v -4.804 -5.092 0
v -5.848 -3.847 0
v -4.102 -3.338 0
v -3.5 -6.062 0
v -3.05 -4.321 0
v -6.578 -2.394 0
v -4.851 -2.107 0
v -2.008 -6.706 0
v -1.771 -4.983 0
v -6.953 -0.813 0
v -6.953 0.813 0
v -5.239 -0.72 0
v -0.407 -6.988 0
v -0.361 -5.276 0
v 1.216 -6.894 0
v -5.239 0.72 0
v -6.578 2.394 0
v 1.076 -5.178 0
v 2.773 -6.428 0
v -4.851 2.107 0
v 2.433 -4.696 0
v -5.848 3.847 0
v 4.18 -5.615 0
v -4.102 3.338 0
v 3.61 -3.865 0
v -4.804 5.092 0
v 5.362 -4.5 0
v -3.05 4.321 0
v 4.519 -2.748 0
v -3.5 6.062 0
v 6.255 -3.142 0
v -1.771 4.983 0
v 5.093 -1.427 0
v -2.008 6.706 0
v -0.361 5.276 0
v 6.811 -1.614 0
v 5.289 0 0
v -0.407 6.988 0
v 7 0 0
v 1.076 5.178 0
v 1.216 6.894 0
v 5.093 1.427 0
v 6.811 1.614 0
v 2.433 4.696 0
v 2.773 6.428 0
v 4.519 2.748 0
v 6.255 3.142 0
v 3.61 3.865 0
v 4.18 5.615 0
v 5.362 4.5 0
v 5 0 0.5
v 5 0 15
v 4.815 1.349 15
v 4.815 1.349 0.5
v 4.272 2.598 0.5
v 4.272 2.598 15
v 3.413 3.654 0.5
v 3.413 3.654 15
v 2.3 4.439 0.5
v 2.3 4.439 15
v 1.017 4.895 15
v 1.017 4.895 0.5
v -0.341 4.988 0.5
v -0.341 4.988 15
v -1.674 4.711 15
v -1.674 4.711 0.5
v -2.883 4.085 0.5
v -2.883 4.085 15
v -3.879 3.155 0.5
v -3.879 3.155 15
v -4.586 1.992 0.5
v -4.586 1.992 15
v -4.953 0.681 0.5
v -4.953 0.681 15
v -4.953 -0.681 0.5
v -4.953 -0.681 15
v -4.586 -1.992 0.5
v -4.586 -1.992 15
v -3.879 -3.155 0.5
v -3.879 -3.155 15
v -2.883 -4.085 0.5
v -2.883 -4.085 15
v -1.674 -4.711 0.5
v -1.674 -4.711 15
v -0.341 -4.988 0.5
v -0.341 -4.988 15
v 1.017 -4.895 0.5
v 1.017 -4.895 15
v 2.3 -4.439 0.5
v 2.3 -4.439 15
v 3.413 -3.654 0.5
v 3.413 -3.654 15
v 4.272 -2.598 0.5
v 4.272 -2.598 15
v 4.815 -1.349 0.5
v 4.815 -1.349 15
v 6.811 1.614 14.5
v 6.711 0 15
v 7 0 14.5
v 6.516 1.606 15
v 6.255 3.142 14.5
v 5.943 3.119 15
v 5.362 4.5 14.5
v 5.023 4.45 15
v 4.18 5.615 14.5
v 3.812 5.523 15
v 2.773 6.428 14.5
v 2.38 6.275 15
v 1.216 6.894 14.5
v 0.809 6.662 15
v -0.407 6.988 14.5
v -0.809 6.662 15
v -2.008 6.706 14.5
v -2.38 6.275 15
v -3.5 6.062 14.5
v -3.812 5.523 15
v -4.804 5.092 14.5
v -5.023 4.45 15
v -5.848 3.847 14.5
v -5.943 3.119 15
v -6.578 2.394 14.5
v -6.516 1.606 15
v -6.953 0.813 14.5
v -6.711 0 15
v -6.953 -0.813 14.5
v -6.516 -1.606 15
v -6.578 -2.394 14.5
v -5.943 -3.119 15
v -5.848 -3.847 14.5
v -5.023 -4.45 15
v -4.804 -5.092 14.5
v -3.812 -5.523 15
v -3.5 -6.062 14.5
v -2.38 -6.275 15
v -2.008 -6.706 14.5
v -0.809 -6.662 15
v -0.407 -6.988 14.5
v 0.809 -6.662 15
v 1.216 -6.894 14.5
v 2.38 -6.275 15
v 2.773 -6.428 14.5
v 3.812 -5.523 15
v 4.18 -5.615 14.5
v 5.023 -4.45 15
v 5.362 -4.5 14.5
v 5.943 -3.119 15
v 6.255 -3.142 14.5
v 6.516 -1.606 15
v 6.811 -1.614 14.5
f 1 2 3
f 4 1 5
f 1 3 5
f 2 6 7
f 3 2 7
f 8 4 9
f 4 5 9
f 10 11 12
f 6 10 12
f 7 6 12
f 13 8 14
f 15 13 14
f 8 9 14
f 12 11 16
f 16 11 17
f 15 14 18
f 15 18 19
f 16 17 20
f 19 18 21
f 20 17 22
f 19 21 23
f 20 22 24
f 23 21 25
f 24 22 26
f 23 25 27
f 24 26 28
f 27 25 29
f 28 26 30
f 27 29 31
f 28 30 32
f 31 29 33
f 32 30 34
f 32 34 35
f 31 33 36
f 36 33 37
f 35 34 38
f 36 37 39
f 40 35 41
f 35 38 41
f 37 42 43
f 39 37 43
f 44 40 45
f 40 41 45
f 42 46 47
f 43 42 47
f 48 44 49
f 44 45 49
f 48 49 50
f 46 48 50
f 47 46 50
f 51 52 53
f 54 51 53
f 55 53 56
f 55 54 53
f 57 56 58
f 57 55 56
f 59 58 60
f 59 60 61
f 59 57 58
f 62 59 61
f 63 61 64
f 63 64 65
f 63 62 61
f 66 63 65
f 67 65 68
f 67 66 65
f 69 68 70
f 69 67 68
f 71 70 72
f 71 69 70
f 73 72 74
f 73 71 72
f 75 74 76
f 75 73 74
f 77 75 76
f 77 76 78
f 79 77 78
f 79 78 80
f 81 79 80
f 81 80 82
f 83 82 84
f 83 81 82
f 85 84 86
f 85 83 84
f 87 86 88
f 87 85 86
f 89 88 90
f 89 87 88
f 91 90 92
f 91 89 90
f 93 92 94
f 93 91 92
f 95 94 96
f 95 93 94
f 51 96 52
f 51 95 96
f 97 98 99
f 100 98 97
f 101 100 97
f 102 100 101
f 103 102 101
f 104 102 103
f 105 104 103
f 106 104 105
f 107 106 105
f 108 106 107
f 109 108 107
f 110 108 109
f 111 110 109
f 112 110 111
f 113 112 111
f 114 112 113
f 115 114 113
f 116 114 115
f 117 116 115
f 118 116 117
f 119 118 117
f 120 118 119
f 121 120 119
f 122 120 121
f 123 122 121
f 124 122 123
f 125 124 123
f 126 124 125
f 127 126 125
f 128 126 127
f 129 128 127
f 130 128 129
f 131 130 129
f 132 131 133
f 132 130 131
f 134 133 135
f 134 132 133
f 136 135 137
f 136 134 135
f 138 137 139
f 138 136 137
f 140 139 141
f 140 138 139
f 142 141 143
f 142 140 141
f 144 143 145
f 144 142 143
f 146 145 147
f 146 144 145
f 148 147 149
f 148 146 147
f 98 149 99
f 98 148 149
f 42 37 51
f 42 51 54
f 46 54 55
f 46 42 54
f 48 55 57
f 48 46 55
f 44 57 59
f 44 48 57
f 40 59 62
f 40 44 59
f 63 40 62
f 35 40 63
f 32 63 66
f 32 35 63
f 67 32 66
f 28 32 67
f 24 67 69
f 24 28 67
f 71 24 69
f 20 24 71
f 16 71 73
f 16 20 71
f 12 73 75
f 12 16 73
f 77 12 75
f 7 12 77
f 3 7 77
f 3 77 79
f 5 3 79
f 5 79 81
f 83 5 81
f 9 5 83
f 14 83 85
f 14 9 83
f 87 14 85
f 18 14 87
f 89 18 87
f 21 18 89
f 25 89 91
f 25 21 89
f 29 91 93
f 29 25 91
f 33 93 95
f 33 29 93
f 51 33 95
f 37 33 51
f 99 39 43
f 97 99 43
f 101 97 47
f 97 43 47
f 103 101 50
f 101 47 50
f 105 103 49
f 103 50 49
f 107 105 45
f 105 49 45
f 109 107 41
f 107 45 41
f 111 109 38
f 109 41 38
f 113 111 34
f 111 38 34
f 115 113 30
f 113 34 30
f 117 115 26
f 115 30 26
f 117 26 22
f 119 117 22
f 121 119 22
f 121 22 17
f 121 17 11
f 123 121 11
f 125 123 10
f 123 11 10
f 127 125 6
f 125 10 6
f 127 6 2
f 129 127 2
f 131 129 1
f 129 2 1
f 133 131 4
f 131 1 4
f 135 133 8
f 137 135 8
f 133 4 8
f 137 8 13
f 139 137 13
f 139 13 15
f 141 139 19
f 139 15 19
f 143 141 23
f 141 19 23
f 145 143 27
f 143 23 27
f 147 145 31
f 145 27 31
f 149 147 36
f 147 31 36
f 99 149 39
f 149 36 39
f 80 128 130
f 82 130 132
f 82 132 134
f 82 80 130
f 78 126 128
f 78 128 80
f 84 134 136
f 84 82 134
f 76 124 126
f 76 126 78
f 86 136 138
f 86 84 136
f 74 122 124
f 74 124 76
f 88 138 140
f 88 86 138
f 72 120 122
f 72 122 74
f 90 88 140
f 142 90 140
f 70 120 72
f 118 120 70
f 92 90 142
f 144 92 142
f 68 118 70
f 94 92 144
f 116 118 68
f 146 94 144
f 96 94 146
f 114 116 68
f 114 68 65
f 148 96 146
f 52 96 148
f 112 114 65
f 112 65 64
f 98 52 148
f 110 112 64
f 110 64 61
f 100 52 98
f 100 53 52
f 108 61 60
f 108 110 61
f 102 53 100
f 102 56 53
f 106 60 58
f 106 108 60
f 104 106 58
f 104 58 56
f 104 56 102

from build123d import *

# Parameters (mm, degrees)
F0_R     = 7
F0_R_2   = 5
F1_DEPTH = 15
F2_SIZE2 = 0.2886751346
F2_SIZE  = 0.5
F3_SIZE2 = 0.2886751346
F3_SIZE  = 0.5


with BuildPart() as f1:
    # F0 (on Top) → F1 (new body)
    with BuildSketch(Plane.XY):
        Circle(F0_R)
        Circle(F0_R_2, mode=Mode.SUBTRACT)
    extrude(amount=F1_DEPTH)

    # F2
    f2_edges = [f1.edges().sort_by_distance(p)[0] for p in [
        (-7, 0, 15),
    ]]
    f2_side = f1.faces().sort_by_distance((-7, 0, 7.5))[0]
    chamfer(f2_edges, length=F2_SIZE, length2=F2_SIZE2, reference=f2_side)

    # F3
    f3_edges = [f1.edges().sort_by_distance(p)[0] for p in [
        (-5, 0, 0),
    ]]
    f3_side = f1.faces().sort_by_distance((-5, 0, 7.5))[0]
    chamfer(f3_edges, length=F3_SIZE, length2=F3_SIZE2, reference=f3_side)


solid = f1.part
